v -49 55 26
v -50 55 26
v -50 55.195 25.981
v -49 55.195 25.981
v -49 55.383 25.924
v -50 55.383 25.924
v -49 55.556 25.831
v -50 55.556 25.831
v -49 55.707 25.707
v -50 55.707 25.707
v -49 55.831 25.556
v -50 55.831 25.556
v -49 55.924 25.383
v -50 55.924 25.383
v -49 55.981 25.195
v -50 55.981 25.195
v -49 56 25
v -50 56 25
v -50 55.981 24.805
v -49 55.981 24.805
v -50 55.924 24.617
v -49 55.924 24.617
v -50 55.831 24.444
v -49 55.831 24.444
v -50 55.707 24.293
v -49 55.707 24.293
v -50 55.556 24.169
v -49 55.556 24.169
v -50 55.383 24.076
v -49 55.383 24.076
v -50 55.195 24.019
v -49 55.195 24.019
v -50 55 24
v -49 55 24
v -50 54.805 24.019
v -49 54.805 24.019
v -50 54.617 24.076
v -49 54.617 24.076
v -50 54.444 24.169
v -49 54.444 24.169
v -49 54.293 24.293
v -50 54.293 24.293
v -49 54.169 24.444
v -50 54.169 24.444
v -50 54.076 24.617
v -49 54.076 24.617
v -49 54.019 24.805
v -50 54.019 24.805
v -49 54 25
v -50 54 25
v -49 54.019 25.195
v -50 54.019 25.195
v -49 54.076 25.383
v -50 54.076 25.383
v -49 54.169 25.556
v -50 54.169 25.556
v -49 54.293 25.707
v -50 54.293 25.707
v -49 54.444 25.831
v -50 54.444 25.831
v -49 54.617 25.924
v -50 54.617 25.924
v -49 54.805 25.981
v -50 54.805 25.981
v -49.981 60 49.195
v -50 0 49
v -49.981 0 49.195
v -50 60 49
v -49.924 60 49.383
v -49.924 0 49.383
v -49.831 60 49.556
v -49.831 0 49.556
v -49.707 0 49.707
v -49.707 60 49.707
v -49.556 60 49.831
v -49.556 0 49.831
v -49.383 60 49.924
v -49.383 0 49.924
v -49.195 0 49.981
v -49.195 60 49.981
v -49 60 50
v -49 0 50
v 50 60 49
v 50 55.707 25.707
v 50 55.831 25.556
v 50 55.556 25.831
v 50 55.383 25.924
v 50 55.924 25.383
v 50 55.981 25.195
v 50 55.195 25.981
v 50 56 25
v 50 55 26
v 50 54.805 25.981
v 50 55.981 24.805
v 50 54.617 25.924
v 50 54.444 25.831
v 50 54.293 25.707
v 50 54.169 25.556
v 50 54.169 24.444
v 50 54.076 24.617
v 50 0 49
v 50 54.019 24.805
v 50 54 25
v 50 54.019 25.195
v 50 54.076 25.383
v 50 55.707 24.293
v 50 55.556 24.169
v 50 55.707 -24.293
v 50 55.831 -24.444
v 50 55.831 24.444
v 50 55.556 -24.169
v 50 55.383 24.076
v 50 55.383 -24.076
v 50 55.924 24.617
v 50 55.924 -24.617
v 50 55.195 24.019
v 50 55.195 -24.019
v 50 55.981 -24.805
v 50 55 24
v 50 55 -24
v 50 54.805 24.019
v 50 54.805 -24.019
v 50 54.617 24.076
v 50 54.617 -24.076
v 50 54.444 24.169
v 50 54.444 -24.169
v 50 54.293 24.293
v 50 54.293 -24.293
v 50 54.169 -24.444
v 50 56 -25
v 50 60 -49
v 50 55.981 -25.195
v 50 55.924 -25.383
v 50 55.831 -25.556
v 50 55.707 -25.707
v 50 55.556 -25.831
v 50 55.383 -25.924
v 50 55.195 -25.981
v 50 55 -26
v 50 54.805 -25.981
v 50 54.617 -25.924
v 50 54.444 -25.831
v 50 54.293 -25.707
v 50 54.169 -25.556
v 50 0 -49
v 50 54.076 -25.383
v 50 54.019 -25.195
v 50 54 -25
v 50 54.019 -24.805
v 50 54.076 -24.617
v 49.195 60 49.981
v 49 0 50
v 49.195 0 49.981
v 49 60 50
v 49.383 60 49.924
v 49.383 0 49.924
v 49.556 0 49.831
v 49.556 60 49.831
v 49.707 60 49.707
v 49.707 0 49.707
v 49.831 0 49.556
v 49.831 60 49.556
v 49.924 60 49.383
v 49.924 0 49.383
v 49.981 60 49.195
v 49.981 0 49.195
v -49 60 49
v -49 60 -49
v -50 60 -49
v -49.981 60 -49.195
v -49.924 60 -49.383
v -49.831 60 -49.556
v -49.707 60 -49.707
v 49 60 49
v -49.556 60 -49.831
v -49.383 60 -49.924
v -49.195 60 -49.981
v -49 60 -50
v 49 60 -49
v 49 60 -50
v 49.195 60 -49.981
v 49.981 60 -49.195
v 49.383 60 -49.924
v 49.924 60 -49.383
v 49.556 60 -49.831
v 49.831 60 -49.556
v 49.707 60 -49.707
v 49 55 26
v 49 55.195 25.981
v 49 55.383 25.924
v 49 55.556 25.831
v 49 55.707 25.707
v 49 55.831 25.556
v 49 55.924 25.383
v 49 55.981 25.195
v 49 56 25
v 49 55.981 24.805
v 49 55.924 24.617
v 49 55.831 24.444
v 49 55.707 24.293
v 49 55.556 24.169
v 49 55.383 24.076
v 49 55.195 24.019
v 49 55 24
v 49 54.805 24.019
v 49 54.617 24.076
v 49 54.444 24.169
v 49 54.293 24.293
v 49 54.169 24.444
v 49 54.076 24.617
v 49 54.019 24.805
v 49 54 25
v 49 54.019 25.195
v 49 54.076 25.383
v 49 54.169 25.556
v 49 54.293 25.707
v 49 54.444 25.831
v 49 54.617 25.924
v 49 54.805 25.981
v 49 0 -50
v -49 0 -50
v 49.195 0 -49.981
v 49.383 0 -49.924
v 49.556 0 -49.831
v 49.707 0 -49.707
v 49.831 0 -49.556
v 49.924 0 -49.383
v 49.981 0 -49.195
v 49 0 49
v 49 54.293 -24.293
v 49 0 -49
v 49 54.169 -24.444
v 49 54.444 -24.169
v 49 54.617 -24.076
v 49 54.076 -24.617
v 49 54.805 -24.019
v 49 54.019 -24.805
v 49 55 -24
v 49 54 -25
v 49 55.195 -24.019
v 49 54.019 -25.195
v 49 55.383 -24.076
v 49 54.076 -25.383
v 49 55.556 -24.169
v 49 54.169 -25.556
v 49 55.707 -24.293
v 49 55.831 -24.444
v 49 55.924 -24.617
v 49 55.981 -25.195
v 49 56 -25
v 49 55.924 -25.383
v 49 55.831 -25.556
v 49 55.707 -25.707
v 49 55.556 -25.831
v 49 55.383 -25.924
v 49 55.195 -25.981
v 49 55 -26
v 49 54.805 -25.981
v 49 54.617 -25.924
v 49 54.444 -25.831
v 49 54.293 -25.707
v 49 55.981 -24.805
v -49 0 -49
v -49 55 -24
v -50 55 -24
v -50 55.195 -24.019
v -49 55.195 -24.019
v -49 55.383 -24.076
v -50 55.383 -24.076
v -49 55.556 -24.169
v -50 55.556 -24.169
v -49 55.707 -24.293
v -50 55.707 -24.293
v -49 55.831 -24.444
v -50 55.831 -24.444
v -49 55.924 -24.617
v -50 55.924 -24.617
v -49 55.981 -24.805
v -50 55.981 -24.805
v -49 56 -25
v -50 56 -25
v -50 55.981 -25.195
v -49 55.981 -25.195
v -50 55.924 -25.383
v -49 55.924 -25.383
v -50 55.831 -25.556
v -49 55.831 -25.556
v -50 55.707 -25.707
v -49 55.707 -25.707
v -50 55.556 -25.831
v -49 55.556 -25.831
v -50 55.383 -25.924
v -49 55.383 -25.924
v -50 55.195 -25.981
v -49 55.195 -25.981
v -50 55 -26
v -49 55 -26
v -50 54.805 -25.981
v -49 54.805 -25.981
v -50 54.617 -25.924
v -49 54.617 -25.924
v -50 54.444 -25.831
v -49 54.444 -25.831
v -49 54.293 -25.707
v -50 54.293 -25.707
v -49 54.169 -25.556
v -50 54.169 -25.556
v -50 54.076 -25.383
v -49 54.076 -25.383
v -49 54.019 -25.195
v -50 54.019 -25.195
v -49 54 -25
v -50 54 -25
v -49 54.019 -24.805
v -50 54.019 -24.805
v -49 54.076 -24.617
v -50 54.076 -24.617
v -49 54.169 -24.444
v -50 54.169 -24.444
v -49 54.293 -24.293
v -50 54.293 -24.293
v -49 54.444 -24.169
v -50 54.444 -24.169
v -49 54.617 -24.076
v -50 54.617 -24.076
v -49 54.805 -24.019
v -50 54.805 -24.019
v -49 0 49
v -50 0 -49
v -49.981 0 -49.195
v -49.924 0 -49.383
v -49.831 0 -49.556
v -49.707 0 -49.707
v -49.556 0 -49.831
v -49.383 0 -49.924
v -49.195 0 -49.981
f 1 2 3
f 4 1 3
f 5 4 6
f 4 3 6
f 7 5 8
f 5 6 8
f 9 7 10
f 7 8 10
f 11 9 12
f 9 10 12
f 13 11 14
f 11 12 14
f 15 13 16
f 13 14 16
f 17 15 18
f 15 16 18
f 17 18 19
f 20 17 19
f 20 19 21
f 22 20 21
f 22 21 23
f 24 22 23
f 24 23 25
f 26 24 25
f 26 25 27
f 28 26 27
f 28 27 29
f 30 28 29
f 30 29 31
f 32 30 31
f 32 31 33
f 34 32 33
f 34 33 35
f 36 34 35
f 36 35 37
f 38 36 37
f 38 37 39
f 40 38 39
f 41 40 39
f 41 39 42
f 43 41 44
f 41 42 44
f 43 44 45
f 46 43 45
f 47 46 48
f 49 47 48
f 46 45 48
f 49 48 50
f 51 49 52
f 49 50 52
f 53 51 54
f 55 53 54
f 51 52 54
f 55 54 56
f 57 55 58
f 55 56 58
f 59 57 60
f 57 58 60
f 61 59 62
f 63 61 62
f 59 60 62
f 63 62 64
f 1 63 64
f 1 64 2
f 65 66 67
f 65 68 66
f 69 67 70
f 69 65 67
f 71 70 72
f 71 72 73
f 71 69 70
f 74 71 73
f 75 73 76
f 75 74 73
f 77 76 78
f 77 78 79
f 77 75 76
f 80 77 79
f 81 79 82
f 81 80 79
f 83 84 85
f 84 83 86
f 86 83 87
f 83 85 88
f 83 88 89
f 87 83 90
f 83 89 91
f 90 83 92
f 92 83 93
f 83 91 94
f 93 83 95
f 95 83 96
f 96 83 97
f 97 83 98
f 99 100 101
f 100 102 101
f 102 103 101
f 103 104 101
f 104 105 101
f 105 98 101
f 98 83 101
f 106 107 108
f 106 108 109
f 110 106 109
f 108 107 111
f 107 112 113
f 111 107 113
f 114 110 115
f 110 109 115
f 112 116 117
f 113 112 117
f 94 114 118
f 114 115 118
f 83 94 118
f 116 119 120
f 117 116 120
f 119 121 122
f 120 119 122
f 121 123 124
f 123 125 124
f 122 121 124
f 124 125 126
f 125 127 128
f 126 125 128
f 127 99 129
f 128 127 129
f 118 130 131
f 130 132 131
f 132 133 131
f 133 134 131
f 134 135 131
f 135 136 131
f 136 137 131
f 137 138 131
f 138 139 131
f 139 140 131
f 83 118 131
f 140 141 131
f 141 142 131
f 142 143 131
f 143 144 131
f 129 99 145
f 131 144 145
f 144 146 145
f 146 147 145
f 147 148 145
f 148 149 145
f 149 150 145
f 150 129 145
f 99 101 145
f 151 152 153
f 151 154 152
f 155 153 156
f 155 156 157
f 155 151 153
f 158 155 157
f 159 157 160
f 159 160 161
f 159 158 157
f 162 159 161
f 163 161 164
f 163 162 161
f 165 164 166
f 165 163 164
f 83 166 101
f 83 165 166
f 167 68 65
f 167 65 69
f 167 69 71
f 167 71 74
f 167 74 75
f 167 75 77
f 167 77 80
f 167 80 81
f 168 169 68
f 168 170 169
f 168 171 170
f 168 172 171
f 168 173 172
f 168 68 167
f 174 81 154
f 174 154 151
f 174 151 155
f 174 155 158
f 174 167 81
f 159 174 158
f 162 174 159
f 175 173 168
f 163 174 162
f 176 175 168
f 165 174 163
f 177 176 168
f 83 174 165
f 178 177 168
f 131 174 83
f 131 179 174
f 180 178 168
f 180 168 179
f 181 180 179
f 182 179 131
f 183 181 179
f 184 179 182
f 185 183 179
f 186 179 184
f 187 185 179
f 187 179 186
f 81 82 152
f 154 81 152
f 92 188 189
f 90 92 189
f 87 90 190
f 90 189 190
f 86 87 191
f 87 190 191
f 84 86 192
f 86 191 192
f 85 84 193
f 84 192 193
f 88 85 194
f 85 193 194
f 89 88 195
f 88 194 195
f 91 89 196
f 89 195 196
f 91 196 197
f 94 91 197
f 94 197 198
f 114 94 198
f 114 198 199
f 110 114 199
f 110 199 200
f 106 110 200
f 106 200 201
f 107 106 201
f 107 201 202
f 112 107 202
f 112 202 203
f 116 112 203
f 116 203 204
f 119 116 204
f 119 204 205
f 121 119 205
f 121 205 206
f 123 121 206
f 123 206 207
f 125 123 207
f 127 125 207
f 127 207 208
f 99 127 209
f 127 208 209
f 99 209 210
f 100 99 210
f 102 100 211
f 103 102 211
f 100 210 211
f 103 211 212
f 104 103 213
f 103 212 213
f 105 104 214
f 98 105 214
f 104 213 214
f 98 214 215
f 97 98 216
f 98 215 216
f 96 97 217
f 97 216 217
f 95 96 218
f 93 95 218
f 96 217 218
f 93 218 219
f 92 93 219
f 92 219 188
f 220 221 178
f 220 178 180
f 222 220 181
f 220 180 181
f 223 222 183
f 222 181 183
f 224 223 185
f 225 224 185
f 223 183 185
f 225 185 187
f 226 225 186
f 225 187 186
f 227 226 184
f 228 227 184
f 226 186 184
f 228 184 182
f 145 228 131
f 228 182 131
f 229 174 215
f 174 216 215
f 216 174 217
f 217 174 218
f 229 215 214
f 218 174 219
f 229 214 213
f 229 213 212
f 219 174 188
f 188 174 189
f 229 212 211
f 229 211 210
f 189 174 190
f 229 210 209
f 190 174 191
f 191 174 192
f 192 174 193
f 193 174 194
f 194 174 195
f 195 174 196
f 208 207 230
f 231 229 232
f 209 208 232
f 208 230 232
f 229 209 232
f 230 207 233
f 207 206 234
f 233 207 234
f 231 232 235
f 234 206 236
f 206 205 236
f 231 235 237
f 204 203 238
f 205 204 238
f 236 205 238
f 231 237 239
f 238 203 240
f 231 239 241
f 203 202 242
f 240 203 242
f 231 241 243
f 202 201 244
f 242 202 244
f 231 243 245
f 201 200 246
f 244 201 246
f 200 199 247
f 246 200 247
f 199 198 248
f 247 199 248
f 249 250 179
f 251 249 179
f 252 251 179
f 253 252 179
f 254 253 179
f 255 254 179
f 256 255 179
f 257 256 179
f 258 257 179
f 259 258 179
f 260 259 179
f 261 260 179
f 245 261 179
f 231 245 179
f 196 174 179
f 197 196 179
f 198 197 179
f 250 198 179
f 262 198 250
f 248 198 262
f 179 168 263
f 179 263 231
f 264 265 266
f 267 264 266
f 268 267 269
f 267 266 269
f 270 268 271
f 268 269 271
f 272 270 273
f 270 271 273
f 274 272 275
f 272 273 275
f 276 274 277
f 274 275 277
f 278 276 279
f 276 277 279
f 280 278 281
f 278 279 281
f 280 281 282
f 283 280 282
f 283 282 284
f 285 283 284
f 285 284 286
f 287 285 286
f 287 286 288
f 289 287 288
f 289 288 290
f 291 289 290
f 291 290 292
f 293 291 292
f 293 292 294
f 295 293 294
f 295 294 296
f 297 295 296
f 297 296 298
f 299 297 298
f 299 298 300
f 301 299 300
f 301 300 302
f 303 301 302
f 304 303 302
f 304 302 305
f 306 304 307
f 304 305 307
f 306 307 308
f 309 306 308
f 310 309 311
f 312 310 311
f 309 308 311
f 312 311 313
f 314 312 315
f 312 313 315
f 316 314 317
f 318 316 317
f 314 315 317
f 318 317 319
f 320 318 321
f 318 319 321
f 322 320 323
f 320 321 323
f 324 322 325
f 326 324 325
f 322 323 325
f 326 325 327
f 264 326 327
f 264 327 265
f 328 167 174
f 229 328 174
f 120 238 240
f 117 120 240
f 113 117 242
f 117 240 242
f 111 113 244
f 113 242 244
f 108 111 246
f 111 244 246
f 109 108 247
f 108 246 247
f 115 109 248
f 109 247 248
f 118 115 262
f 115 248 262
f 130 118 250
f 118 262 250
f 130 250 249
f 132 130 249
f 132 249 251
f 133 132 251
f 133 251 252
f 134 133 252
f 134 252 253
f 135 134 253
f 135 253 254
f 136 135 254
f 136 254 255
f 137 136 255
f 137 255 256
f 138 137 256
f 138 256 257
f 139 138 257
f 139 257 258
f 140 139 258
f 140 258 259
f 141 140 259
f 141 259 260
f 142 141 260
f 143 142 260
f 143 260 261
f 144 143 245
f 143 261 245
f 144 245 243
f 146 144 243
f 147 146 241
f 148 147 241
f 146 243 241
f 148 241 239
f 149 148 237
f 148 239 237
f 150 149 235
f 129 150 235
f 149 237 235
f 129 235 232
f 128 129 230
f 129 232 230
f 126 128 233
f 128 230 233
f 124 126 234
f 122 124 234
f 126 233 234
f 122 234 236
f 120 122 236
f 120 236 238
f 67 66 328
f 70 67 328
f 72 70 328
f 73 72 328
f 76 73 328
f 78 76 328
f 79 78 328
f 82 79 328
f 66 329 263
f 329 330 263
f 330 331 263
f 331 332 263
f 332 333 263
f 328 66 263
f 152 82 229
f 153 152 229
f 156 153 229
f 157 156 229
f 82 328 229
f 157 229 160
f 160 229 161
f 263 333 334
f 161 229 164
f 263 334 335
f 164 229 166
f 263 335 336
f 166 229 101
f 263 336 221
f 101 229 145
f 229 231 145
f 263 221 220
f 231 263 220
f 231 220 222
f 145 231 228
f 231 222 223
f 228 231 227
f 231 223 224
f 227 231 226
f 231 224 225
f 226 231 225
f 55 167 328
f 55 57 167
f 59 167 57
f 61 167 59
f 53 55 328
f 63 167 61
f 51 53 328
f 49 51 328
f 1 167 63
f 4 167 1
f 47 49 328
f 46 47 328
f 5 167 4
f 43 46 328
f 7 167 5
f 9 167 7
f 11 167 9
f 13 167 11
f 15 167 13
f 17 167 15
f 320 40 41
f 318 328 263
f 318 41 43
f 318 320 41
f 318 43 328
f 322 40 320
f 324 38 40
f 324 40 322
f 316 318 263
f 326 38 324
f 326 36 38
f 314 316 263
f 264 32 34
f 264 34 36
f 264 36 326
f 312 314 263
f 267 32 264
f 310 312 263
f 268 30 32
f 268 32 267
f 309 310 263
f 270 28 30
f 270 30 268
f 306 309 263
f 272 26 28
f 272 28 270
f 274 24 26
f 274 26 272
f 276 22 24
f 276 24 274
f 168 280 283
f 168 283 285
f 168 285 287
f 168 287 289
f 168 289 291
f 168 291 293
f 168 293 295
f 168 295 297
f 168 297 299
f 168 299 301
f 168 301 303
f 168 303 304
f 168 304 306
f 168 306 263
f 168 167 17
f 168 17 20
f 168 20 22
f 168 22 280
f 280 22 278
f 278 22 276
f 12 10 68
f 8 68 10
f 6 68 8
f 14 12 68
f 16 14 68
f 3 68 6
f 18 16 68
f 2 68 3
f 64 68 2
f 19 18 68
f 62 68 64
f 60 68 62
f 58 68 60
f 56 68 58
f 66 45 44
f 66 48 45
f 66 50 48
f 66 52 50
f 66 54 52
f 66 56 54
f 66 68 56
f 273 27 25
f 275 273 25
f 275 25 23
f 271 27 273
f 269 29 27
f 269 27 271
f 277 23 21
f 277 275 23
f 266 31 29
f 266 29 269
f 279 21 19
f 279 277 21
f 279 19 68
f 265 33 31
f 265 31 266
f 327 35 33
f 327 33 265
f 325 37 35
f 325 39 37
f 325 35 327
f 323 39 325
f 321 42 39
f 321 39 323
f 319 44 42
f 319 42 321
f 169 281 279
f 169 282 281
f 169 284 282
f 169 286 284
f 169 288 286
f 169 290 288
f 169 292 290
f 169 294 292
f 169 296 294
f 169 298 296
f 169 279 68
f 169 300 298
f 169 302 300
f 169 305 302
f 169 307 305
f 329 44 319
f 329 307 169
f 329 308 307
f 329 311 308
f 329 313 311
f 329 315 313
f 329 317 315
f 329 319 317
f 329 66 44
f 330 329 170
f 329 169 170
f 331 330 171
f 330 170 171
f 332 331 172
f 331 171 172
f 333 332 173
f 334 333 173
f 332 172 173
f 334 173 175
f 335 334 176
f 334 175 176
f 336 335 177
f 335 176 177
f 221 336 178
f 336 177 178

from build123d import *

# Parameters (mm, degrees)
SKETCH1_W           = 100
SKETCH1_H           = 100
BOSS_EXTRUDE1_DEPTH = 60
SKETCH2_W           = 98
SKETCH2_H           = 98
CUT_EXTRUDE1_DEPTH  = 225
SKETCH3_R           = 1
CUT_EXTRUDE2_DEPTH  = 118
FILLET1_R           = 1


with BuildPart() as part:
    # Sketch1 → Boss-Extrude1 (new body)
    with BuildSketch(Plane(origin=(0, 0, 0), x_dir=(1, 0, 0), z_dir=(0, 1, 0))):
        Rectangle(SKETCH1_W, SKETCH1_H)
    extrude(amount=BOSS_EXTRUDE1_DEPTH)

    # Sketch2 → Cut-Extrude1 (cut)
    with BuildSketch(Plane(origin=(0, 60, 0), x_dir=(1, 0, 0), z_dir=(0, 1, 0))):
        Rectangle(SKETCH2_W, SKETCH2_H)
    extrude(amount=-CUT_EXTRUDE1_DEPTH, mode=Mode.SUBTRACT)

    # Sketch3 → Cut-Extrude2 (cut)
    with BuildSketch(Plane.ZY.offset(50)):
        with BuildLine():
            ThreePointArc((-26, 55), (-25, 54), (-24, 55))
            Line((-24, 55), (-26, 55))
        make_face()
        with BuildLine():
            Line((-26, 55), (-24, 55))
            ThreePointArc((-24, 55), (-25, 56), (-26, 55))
        make_face()
        with Locations((25, 55)):
            Circle(SKETCH3_R)
    extrude(amount=-CUT_EXTRUDE2_DEPTH, mode=Mode.SUBTRACT)

    # Fillet1
    fillet1_edges = [part.edges().sort_by_distance(p)[0] for p in [
        (50, 30, 50),
        (-50, 30, 50),
        (-50, 30, -50),
        (50, 30, -50),
    ]]
    fillet(fillet1_edges, radius=FILLET1_R)


solid = part.part
